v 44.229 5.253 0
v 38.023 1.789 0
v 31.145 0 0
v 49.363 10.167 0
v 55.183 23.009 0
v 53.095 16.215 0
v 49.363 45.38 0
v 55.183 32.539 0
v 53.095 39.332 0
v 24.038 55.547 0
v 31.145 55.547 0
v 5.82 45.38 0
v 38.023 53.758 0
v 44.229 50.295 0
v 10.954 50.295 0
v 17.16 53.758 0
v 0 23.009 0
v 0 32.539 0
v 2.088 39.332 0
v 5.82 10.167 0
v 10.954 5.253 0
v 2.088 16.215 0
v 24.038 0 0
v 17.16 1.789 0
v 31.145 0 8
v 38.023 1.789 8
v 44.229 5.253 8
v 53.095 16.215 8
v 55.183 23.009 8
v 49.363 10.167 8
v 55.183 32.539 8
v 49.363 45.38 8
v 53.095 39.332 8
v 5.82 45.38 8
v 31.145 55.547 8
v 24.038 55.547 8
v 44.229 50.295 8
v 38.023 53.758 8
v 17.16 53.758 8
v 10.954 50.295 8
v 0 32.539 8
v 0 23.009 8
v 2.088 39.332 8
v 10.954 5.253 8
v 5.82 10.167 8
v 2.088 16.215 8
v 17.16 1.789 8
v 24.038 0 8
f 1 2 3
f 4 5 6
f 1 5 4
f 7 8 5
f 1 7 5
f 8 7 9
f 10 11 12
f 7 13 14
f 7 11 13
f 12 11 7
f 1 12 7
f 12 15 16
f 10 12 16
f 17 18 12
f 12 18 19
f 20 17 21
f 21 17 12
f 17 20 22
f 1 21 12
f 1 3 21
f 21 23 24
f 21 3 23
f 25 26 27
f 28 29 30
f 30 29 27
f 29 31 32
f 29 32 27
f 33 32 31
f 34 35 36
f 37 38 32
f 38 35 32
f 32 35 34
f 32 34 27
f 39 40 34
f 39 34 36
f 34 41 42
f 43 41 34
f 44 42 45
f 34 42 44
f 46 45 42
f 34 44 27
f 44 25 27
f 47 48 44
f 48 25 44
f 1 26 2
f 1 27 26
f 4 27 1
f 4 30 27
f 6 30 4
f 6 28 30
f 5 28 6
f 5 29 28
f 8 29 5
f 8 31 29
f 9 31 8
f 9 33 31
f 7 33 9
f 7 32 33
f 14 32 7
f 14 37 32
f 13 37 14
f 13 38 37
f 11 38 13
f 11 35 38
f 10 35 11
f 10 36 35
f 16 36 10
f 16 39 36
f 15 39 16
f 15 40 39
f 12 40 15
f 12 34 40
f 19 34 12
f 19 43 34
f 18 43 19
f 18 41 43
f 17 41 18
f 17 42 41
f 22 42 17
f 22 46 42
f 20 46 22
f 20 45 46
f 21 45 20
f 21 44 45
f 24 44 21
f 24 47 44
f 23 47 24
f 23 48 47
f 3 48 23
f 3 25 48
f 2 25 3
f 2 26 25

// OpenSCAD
$fn = 32;

// ----------------------------------------------------------------------
// Flat adaptor: double_d, 8 mm thick
// ----------------------------------------------------------------------

// --- parameters (mm) ---
profile_height = 8;       // extrusion height
profile_points = 24;      // points of the closed outline

profile = [[55.183, 32.539], [53.095, 39.332], [49.363, 45.38], [44.229, 50.295], [38.023, 53.758], [31.145, 55.547], [24.038, 55.547], [17.16, 53.758], [10.954, 50.295], [5.82, 45.38], [2.088, 39.332], [0, 32.539], [0, 23.009], [2.088, 16.215], [5.82, 10.167], [10.954, 5.253], [17.16, 1.789], [24.038, 0], [31.145, 0], [38.023, 1.789], [44.229, 5.253], [49.363, 10.167], [53.095, 16.215], [55.183, 23.009]];  // single closed polygon, 24 points, counter clockwise

// --- the one profile operation ---
linear_extrude(height = profile_height) polygon(points = profile);
